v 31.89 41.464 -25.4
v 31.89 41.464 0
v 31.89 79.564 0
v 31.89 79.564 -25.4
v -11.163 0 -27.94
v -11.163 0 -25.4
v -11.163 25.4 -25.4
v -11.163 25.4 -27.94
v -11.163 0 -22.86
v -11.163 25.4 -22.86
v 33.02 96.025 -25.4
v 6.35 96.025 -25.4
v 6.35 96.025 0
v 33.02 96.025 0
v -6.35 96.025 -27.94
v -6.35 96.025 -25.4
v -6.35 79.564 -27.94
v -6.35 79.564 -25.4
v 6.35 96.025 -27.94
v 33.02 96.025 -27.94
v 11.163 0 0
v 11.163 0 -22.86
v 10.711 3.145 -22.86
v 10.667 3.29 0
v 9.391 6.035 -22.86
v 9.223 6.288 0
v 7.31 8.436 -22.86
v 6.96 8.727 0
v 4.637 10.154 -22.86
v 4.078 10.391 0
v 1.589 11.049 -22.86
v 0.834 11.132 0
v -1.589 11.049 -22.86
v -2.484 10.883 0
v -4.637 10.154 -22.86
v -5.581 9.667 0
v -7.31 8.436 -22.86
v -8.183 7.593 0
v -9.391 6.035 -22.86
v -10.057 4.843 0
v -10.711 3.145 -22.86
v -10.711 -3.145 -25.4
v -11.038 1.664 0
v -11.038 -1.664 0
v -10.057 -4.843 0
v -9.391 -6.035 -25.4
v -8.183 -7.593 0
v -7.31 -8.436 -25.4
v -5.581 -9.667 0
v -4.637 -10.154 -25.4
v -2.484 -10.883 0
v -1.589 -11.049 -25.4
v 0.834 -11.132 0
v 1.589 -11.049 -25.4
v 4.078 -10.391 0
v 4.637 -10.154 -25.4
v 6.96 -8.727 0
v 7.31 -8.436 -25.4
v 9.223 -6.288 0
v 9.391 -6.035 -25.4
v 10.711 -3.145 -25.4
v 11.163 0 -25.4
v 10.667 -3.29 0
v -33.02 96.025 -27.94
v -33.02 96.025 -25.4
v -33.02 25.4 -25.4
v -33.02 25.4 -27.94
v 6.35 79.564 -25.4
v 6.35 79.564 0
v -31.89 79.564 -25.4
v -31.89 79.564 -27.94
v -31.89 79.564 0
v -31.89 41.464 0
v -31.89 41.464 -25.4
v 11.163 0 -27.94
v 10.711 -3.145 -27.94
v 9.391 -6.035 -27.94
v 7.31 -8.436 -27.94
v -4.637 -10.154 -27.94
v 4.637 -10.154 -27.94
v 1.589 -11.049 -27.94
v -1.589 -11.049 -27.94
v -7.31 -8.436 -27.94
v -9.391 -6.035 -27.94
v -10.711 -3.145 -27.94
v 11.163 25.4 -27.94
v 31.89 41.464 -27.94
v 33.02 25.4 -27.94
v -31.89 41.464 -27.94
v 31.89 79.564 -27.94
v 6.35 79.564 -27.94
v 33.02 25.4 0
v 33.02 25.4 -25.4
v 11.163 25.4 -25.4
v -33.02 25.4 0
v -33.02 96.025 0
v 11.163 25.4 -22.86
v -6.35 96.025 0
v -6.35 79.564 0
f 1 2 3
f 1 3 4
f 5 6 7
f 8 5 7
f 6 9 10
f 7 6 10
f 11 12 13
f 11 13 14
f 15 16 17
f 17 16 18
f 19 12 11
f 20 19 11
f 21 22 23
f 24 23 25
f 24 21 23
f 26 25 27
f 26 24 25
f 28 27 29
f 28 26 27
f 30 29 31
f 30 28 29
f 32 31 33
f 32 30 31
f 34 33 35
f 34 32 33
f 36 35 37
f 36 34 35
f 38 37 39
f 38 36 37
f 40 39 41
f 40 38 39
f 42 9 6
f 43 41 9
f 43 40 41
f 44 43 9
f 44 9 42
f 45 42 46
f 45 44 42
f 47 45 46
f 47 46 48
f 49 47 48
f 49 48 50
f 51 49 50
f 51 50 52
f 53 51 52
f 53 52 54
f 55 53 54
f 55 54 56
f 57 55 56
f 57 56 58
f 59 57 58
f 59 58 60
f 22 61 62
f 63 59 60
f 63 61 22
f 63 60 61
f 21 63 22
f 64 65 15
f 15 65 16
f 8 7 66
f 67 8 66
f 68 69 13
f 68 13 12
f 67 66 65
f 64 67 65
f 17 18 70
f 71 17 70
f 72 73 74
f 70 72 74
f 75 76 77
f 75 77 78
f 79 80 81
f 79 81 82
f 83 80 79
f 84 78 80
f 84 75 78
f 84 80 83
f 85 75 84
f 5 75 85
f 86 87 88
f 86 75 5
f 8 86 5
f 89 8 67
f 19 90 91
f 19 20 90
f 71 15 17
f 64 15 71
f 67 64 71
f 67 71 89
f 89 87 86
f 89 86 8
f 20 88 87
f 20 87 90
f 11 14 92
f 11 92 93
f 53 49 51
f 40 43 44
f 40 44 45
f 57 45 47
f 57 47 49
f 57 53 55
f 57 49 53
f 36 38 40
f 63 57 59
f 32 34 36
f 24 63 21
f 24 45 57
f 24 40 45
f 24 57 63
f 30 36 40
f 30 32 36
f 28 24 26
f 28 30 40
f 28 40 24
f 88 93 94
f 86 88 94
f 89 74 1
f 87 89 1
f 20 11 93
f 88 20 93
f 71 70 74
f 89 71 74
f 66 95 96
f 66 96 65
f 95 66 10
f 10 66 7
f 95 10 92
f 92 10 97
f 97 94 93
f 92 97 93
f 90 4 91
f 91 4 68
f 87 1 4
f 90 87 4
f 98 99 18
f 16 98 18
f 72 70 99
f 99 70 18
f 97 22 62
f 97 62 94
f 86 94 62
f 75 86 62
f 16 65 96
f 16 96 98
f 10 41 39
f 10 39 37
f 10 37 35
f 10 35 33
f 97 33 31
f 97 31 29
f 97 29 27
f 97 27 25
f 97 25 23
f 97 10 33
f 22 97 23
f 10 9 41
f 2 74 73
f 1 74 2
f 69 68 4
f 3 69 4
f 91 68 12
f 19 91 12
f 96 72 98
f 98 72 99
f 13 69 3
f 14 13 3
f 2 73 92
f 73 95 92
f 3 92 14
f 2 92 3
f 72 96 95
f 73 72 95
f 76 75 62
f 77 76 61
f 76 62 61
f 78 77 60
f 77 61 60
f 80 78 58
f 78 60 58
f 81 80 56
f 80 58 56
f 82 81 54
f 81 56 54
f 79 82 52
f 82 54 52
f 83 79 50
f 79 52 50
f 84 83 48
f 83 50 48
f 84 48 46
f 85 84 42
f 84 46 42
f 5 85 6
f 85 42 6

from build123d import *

# Parameters (mm, degrees)
SKETCH1_R           = 11.162804955
BOSS_EXTRUDE1_DEPTH = 25.4
BOSS_EXTRUDE2_START = -2.54
BOSS_EXTRUDE2_DEPTH = 2.54
SKETCH4_W           = 66.04
SKETCH4_H           = 25.4
BOSS_EXTRUDE3_DEPTH = 16.064370514
SKETCH5_W           = 1.129641984
SKETCH5_H           = 25.4
BOSS_EXTRUDE4_DEPTH = 38.1
SKETCH6_W           = 26.67
SKETCH6_H           = 25.4
BOSS_EXTRUDE5_DEPTH = 16.461081374
BOSS_EXTRUDE8_DEPTH = 2.54


with BuildPart() as part:
    # Sketch1 → Boss-Extrude1 (new body)
    with BuildSketch(Plane.XY):
        Circle(SKETCH1_R)
    extrude(amount=-BOSS_EXTRUDE1_DEPTH)

    # Sketch2 → Boss-Extrude2 (add)
    with BuildSketch(Plane(origin=(0, 0, -25.4), x_dir=(-1, 0, 0), z_dir=(0, 0, -1)).offset(BOSS_EXTRUDE2_START)):
        with BuildLine():
            Line((-11.162804955, 0), (-11.162804955, 25.4))
            Line((-11.162804955, 25.4), (11.162804955, 25.4))
            Line((11.162804955, 25.4), (11.162804955, 0))
            ThreePointArc((11.162804955, 0), (0, 11.162804955), (-11.162804955, 0))
        make_face()
    extrude(amount=BOSS_EXTRUDE2_DEPTH)

    # Sketch4 → Boss-Extrude3 (add)
    with BuildSketch(Plane(origin=(0, 25.4, 0), x_dir=(1, 0, 0), z_dir=(0, 1, 0))):
        with Locations((0, 12.7)):
            Rectangle(SKETCH4_W, SKETCH4_H)
    extrude(amount=BOSS_EXTRUDE3_DEPTH)

    # Sketch5 → Boss-Extrude4 (add)
    with BuildSketch(Plane(origin=(0, 41.464370514, 0), x_dir=(1, 0, 0), z_dir=(0, 1, 0))):
        with Locations((-32.455179008, 12.7)):
            Rectangle(SKETCH5_W, SKETCH5_H)
        with Locations((32.455179008, 12.7)):
            Rectangle(SKETCH5_W, SKETCH5_H)
    extrude(amount=BOSS_EXTRUDE4_DEPTH)

    # Sketch6 → Boss-Extrude5 (add)
    with BuildSketch(Plane(origin=(0, 79.564370514, 0), x_dir=(1, 0, 0), z_dir=(0, 1, 0))):
        with Locations((19.685, 12.7)):
            Rectangle(SKETCH6_W, SKETCH6_H)
        with Locations((-19.685, 12.7)):
            Rectangle(SKETCH6_W, SKETCH6_H)
    extrude(amount=BOSS_EXTRUDE5_DEPTH)

    # Sketch10 → Boss-Extrude8 (add)
    with BuildSketch(Plane(origin=(0, 0, -25.4), x_dir=(-1, 0, 0), z_dir=(0, 0, -1))):
        with BuildLine():
            Line((11.162804955, 0), (11.162804955, 25.4))
            Line((11.162804955, 25.4), (33.02, 25.4))
            Line((33.02, 25.4), (33.02, 96.025451888))
            Line((33.02, 96.025451888), (6.35, 96.025451888))
            Line((6.35, 96.025451888), (6.35, 79.564370514))
            Line((6.35, 79.564370514), (31.890358016, 79.564370514))
            Line((31.890358016, 79.564370514), (31.890358016, 41.464370514))
            Line((31.890358016, 41.464370514), (-31.890358016, 41.464370514))
            Line((-31.890358016, 41.464370514), (-31.890358016, 79.564370514))
            Line((-31.890358016, 79.564370514), (-6.35, 79.564370514))
            Line((-6.35, 79.564370514), (-6.35, 96.025451888))
            Line((-6.35, 96.025451888), (-33.02, 96.025451888))
            Line((-33.02, 96.025451888), (-33.02, 25.4))
            Line((-33.02, 25.4), (-11.162804955, 25.4))
            Line((-11.162804955, 25.4), (-11.162804955, 0))
            ThreePointArc((-11.162804955, 0), (0, -11.162804955), (11.162804955, 0))
        make_face()
    extrude(amount=BOSS_EXTRUDE8_DEPTH)


solid = part.part
